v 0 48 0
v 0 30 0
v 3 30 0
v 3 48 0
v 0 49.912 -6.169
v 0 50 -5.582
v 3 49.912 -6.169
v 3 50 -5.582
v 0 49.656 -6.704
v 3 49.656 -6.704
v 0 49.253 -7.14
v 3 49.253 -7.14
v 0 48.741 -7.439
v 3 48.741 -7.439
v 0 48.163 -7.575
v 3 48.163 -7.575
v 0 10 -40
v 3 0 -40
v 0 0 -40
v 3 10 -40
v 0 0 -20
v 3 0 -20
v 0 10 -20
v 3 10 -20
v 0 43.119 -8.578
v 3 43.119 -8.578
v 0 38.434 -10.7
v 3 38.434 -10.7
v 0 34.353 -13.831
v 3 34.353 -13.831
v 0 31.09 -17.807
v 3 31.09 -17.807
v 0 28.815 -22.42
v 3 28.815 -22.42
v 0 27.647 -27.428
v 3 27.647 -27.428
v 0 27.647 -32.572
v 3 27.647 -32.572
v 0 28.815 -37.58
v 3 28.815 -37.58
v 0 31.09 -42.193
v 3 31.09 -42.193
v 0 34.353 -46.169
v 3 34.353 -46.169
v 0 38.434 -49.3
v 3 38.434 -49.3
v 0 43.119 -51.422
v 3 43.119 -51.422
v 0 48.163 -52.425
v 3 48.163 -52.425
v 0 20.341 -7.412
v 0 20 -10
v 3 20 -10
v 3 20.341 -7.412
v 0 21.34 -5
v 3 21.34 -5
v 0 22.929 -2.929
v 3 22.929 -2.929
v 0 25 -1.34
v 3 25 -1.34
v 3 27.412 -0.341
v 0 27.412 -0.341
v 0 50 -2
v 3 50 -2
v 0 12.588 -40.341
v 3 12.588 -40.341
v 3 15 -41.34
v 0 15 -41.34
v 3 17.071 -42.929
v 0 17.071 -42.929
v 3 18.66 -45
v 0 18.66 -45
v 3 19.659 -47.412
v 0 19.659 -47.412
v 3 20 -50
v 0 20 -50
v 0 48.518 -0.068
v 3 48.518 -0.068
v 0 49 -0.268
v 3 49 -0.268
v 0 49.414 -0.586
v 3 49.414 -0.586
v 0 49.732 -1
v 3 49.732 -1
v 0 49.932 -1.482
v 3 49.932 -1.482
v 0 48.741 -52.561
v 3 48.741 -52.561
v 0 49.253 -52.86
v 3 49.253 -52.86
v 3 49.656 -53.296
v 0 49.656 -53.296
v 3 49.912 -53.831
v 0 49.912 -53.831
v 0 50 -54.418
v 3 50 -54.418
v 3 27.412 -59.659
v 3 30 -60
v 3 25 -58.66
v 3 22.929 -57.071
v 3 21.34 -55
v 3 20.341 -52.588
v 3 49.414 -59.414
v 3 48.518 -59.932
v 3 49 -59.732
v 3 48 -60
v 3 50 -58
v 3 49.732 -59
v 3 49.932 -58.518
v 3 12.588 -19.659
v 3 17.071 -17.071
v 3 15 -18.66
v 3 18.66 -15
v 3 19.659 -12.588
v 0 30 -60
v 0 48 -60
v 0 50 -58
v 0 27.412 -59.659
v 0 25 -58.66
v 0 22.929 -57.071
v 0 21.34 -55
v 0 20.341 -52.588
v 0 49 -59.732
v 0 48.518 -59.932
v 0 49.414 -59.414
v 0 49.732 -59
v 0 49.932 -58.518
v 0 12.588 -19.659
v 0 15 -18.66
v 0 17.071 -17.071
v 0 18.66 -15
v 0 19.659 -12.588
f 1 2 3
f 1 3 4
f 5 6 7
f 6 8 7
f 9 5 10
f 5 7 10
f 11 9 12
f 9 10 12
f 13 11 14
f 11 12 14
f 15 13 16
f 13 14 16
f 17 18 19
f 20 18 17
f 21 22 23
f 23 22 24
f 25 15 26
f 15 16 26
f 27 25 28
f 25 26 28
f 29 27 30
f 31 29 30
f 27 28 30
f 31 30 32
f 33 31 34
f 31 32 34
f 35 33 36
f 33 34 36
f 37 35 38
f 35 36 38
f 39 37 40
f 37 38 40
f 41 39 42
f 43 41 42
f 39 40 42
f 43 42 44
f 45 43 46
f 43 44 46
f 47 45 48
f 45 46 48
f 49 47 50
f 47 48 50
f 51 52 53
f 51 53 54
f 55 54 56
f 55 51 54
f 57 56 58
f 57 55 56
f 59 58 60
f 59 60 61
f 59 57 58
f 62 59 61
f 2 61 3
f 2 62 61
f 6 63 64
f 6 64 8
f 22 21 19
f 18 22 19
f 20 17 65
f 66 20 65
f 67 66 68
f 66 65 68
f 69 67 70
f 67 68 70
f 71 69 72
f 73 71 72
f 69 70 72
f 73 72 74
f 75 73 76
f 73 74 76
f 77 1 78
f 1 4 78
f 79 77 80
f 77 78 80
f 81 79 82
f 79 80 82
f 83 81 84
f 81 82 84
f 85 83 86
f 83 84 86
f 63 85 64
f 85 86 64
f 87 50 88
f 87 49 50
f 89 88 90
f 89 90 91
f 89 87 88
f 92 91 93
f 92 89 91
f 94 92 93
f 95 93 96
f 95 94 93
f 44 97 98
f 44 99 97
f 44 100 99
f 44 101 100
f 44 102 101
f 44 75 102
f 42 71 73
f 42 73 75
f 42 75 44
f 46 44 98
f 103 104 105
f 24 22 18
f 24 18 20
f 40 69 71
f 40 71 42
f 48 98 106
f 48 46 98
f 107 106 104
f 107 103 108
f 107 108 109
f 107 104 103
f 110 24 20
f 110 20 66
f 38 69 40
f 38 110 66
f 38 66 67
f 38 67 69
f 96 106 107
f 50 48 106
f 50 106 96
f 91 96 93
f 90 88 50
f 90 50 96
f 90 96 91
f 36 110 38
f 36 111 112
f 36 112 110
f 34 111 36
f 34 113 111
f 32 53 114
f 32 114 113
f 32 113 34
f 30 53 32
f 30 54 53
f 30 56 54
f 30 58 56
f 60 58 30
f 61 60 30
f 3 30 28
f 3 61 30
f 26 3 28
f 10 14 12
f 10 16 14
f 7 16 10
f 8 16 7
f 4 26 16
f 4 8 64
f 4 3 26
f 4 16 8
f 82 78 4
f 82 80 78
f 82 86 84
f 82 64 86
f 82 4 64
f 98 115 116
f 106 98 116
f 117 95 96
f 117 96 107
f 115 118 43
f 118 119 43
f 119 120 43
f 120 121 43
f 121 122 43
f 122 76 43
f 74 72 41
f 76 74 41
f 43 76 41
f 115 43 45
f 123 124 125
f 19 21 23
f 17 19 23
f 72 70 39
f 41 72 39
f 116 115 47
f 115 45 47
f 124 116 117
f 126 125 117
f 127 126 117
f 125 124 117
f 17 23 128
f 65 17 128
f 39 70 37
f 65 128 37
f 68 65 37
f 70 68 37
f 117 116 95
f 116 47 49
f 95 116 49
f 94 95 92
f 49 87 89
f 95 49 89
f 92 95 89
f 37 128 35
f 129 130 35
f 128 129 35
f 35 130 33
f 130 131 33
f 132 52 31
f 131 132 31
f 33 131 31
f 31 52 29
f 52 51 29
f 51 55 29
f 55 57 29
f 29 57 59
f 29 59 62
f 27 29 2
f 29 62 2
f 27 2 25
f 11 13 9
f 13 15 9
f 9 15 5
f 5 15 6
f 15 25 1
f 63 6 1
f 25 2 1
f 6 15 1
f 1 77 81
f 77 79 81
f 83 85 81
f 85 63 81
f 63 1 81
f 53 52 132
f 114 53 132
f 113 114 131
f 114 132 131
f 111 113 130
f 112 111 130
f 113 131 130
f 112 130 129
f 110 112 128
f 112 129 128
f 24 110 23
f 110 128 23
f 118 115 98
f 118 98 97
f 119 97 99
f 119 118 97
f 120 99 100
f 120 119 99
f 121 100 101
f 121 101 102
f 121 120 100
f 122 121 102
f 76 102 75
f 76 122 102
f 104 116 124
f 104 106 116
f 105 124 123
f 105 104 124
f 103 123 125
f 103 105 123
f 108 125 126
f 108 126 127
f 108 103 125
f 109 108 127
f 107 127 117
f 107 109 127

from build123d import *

# Parameters (mm, degrees)
SKETCH1_W           = 60
SKETCH1_H           = 50
BOSS_EXTRUDE1_DEPTH = 3
SKETCH2_W           = 20
SKETCH2_H           = 20
CUT_EXTRUDE1_DEPTH  = 3
SKETCH5_R           = 22.5
CUT_EXTRUDE2_DEPTH  = 3
FILLET1_DEPTH       = 3
FILLET1_2_DEPTH     = 3
FILLET2_R           = 2


with BuildPart() as part:
    # Sketch1 → Boss-Extrude1 (new body)
    with BuildSketch(Plane(origin=(0, 0, 0), x_dir=(0, 0, -1), z_dir=(1, 0, 0))):
        with Locations((30, 25)):
            Rectangle(SKETCH1_W, SKETCH1_H)
    extrude(amount=BOSS_EXTRUDE1_DEPTH)

    # Sketch2 → Cut-Extrude1 (cut)
    with BuildSketch(Plane(origin=(3, 0, 0), x_dir=(0, 0, -1), z_dir=(1, 0, 0))):
        with Locations((10, 10)):
            Rectangle(SKETCH2_W, SKETCH2_H)
        with Locations((50, 10)):
            Rectangle(SKETCH2_W, SKETCH2_H)
    extrude(amount=-CUT_EXTRUDE1_DEPTH, mode=Mode.SUBTRACT)

    # Sketch5 → Cut-Extrude2 (cut)
    with BuildSketch(Plane(origin=(3, 0, 0), x_dir=(0, 0, -1), z_dir=(1, 0, 0))):
        with Locations((30, 50)):
            Circle(SKETCH5_R)
    extrude(amount=-CUT_EXTRUDE2_DEPTH, mode=Mode.SUBTRACT)

    # Fillet1: read off the stored shape, not the designer's step
    # Fillet1 outline → Fillet1 (cut)
    with BuildSketch(Plane.YZ):
        with BuildLine():
            ThreePointArc((30, -60), (22.928932188, -57.071067812), (20, -50))
            Line((20, -50), (20, -60))
            Line((20, -60), (30, -60))
        make_face()
        with BuildLine():
            ThreePointArc((20, -10), (22.928932188, -2.928932188), (30, 0))
            Line((30, 0), (20, 0))
            Line((20, 0), (20, -10))
        make_face()
    extrude(amount=FILLET1_DEPTH, mode=Mode.SUBTRACT)

    # Fillet1 2 outline → Fillet1 2 (add)
    with BuildSketch(Plane.YZ):
        with BuildLine():
            ThreePointArc((10, -40), (17.071067812, -42.928932188), (20, -50))
            Line((20, -50), (20, -40))
            Line((20, -40), (10, -40))
        make_face()
        with BuildLine():
            Line((20, -20), (20, -10))
            ThreePointArc((20, -10), (17.071067812, -17.071067812), (10, -20))
            Line((10, -20), (20, -20))
        make_face()
    extrude(amount=FILLET1_2_DEPTH)

    # Fillet2
    fillet2_edges = [part.edges().sort_by_distance(p)[0] for p in [
        (1.5, 50, -52.5),
        (1.5, 50, -7.5),
        (1.5, 50, 0),
        (1.5, 50, -60),
    ]]
    fillet(fillet2_edges, radius=FILLET2_R)


solid = part.part
